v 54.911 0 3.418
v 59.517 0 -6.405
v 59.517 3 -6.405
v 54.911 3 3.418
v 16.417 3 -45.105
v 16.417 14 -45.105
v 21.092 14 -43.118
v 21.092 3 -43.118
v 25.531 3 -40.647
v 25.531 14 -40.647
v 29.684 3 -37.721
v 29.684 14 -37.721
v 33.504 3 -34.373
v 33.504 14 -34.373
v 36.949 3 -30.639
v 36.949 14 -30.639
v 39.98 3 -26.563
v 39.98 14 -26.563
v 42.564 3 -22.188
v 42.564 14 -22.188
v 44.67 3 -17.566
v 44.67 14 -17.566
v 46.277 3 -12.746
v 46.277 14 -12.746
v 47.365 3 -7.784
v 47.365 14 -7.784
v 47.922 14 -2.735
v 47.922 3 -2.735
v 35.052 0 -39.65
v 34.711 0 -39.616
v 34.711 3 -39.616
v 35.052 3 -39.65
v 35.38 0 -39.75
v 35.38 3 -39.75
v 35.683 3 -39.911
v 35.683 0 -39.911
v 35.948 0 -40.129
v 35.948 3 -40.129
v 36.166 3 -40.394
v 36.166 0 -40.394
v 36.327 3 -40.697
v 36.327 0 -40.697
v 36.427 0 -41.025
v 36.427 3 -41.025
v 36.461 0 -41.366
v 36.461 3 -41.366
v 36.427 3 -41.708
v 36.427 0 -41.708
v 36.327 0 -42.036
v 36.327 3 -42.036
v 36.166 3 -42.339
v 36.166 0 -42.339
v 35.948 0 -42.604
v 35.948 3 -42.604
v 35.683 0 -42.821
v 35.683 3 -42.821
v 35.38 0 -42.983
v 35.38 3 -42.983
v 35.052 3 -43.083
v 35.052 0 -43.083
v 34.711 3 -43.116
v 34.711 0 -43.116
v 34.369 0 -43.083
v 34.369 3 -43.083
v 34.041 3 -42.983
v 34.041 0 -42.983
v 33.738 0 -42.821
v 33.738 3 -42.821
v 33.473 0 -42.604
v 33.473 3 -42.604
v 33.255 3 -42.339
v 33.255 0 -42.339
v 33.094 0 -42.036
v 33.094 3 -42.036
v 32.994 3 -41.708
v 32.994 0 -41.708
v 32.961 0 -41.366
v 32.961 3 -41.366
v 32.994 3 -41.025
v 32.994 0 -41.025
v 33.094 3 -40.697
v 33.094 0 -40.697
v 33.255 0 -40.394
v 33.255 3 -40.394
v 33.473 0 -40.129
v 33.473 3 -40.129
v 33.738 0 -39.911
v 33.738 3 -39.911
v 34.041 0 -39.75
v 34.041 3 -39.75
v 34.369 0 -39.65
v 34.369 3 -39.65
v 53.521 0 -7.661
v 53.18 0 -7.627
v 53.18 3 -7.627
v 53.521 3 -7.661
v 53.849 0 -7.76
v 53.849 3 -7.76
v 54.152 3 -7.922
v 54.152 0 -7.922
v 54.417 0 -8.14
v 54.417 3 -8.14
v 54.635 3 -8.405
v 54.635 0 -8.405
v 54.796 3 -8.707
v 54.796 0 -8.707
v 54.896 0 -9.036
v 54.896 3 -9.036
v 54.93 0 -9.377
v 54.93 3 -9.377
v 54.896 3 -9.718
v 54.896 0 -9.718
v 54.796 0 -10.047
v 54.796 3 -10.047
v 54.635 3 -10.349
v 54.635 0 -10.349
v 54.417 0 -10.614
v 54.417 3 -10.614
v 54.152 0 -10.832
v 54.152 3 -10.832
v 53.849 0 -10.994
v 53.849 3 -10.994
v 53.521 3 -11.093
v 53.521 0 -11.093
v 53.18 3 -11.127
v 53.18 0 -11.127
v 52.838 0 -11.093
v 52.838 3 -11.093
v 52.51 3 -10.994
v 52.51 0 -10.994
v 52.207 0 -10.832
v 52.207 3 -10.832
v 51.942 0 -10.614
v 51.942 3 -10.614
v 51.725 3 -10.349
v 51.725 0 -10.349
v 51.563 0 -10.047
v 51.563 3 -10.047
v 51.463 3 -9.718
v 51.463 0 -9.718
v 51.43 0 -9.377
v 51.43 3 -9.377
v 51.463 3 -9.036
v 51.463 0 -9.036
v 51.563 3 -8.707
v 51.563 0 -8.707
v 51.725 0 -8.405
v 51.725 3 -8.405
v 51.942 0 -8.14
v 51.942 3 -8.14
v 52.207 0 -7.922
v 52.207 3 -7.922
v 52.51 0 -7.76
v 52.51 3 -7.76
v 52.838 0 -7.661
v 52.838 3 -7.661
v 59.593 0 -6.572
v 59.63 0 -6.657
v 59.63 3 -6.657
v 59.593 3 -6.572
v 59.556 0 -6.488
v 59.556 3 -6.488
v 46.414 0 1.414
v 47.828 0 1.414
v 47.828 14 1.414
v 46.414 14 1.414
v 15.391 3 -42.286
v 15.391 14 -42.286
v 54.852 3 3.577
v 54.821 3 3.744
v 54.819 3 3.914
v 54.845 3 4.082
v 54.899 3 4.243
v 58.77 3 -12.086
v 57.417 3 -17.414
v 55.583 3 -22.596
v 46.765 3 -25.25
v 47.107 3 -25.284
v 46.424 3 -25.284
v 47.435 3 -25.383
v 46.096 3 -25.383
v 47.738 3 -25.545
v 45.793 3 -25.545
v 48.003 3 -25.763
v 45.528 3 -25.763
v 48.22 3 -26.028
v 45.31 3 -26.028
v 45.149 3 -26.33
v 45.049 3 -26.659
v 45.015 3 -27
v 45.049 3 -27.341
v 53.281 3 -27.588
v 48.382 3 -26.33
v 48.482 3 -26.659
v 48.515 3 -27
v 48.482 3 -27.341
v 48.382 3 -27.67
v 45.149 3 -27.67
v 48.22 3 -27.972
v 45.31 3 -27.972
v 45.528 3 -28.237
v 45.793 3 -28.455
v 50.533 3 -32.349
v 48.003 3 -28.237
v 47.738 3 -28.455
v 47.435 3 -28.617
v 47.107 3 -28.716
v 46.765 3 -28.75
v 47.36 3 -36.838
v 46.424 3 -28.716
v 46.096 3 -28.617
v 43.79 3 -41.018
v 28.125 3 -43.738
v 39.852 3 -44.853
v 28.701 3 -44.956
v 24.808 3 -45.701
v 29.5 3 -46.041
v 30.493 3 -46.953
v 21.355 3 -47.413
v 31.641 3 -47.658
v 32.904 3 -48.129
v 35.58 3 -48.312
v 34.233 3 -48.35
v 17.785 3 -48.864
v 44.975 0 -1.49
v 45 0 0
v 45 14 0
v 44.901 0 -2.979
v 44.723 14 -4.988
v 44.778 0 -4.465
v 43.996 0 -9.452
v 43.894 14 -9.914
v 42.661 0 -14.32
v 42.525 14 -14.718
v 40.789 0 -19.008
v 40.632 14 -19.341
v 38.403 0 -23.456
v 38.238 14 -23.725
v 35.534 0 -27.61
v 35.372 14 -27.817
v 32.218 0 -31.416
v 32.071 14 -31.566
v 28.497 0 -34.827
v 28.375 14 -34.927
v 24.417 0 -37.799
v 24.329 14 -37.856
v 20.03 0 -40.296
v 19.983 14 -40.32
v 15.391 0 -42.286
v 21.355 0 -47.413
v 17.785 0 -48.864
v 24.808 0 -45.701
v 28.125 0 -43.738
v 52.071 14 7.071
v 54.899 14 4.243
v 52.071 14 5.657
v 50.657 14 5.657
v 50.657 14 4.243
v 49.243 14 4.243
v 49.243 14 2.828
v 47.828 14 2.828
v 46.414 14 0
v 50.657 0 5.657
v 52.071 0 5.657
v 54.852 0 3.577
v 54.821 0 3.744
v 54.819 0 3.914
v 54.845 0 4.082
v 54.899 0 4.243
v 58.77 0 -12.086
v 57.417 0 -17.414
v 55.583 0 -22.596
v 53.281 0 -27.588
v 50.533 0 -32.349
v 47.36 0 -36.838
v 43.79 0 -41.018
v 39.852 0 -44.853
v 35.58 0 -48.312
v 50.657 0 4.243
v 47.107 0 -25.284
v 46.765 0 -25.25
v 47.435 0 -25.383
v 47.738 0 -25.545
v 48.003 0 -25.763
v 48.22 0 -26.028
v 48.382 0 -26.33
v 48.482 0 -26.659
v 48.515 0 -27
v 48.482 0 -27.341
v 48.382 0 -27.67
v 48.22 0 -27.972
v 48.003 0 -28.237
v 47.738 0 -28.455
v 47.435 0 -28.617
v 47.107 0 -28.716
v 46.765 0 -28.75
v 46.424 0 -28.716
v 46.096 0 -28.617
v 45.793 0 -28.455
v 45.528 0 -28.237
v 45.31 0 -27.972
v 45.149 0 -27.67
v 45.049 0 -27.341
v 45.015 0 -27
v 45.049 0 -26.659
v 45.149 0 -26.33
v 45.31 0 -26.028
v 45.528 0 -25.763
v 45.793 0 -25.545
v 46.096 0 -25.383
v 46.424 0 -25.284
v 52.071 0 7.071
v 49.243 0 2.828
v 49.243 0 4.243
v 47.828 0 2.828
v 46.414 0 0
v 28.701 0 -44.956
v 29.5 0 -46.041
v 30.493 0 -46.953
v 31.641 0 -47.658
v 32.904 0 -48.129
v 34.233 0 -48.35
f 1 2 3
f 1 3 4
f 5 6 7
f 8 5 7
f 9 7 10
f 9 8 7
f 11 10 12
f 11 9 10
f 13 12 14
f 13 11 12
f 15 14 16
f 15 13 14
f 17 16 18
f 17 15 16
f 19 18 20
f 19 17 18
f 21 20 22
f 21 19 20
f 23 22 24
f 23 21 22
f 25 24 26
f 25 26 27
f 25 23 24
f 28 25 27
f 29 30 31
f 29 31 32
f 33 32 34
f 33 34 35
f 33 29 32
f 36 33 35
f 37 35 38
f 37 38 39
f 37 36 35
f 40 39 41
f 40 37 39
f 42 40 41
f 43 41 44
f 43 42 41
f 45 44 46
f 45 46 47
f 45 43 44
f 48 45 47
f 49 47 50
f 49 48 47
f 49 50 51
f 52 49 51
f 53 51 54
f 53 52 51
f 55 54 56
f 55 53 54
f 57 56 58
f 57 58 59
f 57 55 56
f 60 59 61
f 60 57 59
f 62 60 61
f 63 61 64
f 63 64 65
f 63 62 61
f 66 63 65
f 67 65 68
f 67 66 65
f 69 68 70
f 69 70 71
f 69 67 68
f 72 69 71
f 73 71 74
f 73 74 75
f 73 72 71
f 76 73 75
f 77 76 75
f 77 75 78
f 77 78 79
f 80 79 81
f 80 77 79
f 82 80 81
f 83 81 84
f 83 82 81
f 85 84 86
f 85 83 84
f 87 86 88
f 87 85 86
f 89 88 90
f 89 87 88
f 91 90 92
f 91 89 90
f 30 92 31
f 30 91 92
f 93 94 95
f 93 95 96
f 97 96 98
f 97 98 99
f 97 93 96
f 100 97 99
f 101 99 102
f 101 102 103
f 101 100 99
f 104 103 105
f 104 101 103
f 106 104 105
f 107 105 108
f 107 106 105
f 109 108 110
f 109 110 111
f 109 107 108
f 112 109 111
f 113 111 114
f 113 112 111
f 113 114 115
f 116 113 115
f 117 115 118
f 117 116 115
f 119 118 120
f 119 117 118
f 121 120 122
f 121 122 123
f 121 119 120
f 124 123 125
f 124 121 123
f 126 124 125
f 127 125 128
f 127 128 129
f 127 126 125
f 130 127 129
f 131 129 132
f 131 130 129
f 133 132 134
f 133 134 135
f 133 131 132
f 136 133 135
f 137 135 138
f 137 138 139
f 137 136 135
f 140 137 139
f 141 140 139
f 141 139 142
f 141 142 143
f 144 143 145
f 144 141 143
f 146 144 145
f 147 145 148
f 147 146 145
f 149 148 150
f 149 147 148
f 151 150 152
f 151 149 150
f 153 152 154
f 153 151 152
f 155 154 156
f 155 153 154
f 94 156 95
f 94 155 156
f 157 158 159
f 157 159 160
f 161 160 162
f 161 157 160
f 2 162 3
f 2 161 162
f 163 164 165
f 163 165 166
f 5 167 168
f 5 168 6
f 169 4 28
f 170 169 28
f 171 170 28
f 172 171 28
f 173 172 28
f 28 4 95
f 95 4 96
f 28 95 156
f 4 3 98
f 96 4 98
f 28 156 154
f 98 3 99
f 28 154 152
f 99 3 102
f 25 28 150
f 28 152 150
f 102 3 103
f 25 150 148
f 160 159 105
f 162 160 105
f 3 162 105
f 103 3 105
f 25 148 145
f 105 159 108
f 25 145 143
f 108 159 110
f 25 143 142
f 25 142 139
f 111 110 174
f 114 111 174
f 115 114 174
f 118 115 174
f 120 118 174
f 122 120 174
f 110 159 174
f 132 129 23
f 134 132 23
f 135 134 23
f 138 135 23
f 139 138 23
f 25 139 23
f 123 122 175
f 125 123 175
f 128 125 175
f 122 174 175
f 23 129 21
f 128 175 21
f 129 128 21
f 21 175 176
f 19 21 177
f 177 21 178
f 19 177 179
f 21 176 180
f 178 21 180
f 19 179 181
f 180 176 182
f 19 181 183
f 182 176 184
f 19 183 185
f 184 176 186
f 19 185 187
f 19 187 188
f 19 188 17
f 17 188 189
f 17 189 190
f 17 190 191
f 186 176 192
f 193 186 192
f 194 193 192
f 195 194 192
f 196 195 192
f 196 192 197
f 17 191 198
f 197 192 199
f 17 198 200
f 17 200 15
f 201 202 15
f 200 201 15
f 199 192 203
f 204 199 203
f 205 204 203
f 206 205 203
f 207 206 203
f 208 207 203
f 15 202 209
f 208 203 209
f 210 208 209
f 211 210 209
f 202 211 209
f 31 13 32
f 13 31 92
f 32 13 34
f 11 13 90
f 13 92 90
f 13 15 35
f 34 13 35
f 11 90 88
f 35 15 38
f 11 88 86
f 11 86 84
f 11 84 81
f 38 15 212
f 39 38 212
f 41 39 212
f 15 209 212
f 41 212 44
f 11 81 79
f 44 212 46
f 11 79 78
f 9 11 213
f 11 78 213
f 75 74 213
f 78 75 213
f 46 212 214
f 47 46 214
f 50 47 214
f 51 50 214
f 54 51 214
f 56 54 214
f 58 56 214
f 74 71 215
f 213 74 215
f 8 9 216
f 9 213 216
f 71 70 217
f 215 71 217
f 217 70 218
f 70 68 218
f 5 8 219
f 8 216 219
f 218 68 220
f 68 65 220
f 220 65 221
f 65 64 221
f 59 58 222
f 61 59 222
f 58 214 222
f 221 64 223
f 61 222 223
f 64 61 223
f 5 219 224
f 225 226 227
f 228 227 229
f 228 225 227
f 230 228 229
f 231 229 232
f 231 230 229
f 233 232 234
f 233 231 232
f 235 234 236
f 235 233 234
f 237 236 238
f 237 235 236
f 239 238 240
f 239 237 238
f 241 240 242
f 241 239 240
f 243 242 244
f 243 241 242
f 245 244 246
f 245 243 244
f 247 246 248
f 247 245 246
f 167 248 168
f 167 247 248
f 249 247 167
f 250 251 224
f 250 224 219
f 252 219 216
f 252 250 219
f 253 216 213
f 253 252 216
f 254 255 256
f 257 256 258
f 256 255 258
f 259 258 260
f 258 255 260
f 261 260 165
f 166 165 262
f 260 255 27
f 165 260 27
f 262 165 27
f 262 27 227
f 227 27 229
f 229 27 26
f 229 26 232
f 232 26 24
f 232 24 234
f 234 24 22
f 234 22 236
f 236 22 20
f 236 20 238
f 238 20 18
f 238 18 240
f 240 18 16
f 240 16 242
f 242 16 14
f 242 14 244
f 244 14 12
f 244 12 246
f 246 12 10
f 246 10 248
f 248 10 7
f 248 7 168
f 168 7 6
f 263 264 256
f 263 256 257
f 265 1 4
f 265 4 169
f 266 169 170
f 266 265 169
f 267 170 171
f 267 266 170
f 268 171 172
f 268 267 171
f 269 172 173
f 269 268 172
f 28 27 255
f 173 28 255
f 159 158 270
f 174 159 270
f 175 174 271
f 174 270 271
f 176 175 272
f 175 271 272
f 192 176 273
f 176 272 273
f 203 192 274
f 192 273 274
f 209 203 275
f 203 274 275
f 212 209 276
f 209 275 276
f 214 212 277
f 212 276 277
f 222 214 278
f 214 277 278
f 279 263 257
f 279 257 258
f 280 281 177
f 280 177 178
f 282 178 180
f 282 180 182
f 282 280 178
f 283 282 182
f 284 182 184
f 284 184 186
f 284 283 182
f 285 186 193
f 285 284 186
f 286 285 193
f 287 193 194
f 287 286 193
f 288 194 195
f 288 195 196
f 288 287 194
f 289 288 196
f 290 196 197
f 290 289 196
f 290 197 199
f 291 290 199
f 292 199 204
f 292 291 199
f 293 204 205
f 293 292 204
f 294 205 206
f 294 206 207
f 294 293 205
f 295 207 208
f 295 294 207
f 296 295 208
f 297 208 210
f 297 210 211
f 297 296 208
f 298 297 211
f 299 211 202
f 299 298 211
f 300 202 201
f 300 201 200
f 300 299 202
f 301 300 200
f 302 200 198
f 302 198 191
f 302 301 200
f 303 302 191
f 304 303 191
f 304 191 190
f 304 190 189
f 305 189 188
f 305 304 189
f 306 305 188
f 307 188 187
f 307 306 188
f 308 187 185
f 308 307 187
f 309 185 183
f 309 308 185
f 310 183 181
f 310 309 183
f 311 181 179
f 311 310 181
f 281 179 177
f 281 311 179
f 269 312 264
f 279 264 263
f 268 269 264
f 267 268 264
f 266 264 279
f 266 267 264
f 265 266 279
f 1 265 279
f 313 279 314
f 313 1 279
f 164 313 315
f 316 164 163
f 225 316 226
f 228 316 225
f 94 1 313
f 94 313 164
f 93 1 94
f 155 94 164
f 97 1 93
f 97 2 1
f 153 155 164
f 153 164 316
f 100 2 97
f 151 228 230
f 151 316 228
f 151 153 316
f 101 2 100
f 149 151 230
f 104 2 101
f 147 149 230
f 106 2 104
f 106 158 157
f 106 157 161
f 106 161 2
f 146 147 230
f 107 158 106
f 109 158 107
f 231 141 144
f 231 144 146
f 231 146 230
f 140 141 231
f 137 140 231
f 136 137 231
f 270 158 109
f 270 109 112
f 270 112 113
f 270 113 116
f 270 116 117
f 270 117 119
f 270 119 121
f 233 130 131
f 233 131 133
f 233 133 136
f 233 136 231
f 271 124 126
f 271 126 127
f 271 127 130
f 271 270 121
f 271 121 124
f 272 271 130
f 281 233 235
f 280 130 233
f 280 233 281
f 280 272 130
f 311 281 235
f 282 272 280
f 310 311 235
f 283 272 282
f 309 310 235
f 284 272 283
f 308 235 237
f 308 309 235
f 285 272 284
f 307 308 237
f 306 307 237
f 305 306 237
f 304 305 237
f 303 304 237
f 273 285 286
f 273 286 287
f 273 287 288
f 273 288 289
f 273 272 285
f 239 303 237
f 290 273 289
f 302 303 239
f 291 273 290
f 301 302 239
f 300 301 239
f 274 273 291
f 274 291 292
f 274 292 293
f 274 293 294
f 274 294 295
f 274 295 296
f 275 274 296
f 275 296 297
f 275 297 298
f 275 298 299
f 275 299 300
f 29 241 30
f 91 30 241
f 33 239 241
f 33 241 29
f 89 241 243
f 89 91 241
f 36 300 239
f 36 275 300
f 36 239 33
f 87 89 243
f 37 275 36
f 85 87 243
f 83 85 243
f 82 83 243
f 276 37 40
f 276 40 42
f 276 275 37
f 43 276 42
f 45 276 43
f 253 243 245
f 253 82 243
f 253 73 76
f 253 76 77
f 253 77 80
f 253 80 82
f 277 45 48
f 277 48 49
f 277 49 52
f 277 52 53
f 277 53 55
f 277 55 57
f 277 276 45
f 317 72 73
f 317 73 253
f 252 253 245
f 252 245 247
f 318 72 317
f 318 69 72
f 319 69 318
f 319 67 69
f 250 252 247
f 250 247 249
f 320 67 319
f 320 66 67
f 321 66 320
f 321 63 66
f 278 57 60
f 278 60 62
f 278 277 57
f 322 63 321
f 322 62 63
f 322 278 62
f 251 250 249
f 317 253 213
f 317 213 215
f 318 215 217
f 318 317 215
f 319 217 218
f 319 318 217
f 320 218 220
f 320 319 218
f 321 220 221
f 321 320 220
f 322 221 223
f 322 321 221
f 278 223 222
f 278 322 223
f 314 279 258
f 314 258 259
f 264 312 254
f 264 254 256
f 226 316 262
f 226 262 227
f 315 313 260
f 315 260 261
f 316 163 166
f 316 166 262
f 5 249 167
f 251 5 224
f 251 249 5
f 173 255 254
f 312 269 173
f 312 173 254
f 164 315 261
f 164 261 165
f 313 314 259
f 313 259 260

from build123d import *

# Parameters (mm, degrees)
SKETCH_1_R               = 1.75
EXTRUDE_1_DEPTH          = 3
EXTRUDE_2_DEPTH          = 11
EXTRUDE_2_DEPTH_BACK     = 3
CUT_EXTRUDE_1_DEPTH      = 79.296095621
CUT_EXTRUDE_1_DEPTH_BACK = 79.296095621
SKETCH_4_R               = 75.737398045
SKETCH_4_R_2             = 60
FILLET_1_R               = 1


with BuildPart() as part:
    # Эскиз1 → Бобышка-Вытянуть1 (new body)
    with BuildSketch(Plane(origin=(0, 0, 0), x_dir=(1, 0, 0), z_dir=(0, 1, 0))):
        with BuildLine():
            Line((15.39090645, 42.286167935), (17.785047453, 48.864016281))
            ThreePointArc((17.785047453, 48.864016281), (23.097425832, 46.588720952), (28.124517408, 43.737987157))
            ThreePointArc((28.124517408, 43.737987157), (32.887215772, 48.124766732), (39.210044191, 46.72871103))
            ThreePointArc((39.210044191, 46.72871103), (52.827549631, 30.5), (60.073272934, 10.592538838))
            ThreePointArc((60.073272934, 10.592538838), (60.118729466, 8.455730047), (59.51728837, 6.404806668))
            Line((59.51728837, 6.404806668), (54.192372599, -4.949615977))
            Line((54.192372599, -4.949615977), (44.777960949, 4.464774712))
            ThreePointArc((44.777960949, 4.464774712), (35.534315772, 27.610005481), (15.39090645, 42.286167935))
        make_face()
        with Locations(Location((34.710530923, 41.366399928, 0), (0, 0, 270))):
            Circle(SKETCH_1_R, mode=Mode.SUBTRACT)
        with Locations(Location((46.765371804, 27, 0), (0, 0, 270))):
            Circle(SKETCH_1_R, mode=Mode.SUBTRACT)
        with Locations(Location((53.179618663, 9.377001594, 0), (0, 0, 270))):
            Circle(SKETCH_1_R, mode=Mode.SUBTRACT)
    extrude(amount=EXTRUDE_1_DEPTH)

    # Эскиз2 → Бобышка-Вытянуть2 (add, two sides: drawn at the far end of the back side and taken through both)
    with BuildSketch(Plane(origin=(0, 3, 0), x_dir=(1, 0, 0), z_dir=(0, 1, 0)).offset(-EXTRUDE_2_DEPTH_BACK)):
        with BuildLine():
            Line((52.071067812, -7.071067812), (52.071067812, -5.656854249))
            Line((52.071067812, -5.656854249), (50.656854249, -5.656854249))
            Line((50.656854249, -5.656854249), (50.656854249, -4.242640687))
            Line((50.656854249, -4.242640687), (49.242640687, -4.242640687))
            Line((49.242640687, -4.242640687), (49.242640687, -2.828427125))
            Line((49.242640687, -2.828427125), (47.828427125, -2.828427125))
            Line((47.828427125, -2.828427125), (47.828427125, -1.414213562))
            Line((47.828427125, -1.414213562), (46.414213562, -1.414213562))
            Line((46.414213562, -1.414213562), (46.414213562, 0))
            Line((46.414213562, 0), (45, 0))
            ThreePointArc((45, 0), (36.861841993, 25.810939636), (15.39090645, 42.286167935))
            Line((15.39090645, 42.286167935), (16.41696688, 45.105245798))
            ThreePointArc((16.41696688, 45.105245798), (38.518692264, 28.641060494), (47.922027533, 2.734826717))
            Line((47.922027533, 2.734826717), (54.899494937, -4.242640687))
            Line((54.899494937, -4.242640687), (52.071067812, -7.071067812))
        make_face()
    extrude(amount=EXTRUDE_2_DEPTH + EXTRUDE_2_DEPTH_BACK)

    # Эскиз4 → Вырез-Вытянуть1 (cut, two sides: drawn at the far end of the back side and taken through both)
    with BuildSketch(Plane(origin=(0, 3, 0), x_dir=(1, 0, 0), z_dir=(0, 1, 0)).offset(-CUT_EXTRUDE_1_DEPTH_BACK)):
        Circle(SKETCH_4_R)
        Circle(SKETCH_4_R_2, mode=Mode.SUBTRACT)
    extrude(amount=CUT_EXTRUDE_1_DEPTH + CUT_EXTRUDE_1_DEPTH_BACK, mode=Mode.SUBTRACT)

    # Скругление1
    # the kernel refuses this fillet: 1 mm, written as the material it adds along each edge
    with BuildSketch(Plane(origin=(54.643826402, 0, 3.986972152), x_dir=(0.7071067811866617, 0, 0.7071067811864333), z_dir=(0, 1, 0))) as fillet_1_piece_1:
        with BuildLine():
            CenterArc((0.726813354, 0.93091204), FILLET_1_R, 199.874698522, 48.702735989)
            Line((-0.213624991, 0.590947748), (-0.232433757, 0.584148463))
            Line((-0.232433757, 0.584148463), (-0.018808767, -0.006799286))
            Line((-0.018808767, -0.006799286), (0, -0.02))
            ThreePointArc((0, -0.02), (0.180784955, -0.02), (0.35426504, -0.018618241))
            Line((0.35426504, -0.018618241), (0.361569909, 0))
        make_face()
    extrude(amount=3)


solid = part.part
